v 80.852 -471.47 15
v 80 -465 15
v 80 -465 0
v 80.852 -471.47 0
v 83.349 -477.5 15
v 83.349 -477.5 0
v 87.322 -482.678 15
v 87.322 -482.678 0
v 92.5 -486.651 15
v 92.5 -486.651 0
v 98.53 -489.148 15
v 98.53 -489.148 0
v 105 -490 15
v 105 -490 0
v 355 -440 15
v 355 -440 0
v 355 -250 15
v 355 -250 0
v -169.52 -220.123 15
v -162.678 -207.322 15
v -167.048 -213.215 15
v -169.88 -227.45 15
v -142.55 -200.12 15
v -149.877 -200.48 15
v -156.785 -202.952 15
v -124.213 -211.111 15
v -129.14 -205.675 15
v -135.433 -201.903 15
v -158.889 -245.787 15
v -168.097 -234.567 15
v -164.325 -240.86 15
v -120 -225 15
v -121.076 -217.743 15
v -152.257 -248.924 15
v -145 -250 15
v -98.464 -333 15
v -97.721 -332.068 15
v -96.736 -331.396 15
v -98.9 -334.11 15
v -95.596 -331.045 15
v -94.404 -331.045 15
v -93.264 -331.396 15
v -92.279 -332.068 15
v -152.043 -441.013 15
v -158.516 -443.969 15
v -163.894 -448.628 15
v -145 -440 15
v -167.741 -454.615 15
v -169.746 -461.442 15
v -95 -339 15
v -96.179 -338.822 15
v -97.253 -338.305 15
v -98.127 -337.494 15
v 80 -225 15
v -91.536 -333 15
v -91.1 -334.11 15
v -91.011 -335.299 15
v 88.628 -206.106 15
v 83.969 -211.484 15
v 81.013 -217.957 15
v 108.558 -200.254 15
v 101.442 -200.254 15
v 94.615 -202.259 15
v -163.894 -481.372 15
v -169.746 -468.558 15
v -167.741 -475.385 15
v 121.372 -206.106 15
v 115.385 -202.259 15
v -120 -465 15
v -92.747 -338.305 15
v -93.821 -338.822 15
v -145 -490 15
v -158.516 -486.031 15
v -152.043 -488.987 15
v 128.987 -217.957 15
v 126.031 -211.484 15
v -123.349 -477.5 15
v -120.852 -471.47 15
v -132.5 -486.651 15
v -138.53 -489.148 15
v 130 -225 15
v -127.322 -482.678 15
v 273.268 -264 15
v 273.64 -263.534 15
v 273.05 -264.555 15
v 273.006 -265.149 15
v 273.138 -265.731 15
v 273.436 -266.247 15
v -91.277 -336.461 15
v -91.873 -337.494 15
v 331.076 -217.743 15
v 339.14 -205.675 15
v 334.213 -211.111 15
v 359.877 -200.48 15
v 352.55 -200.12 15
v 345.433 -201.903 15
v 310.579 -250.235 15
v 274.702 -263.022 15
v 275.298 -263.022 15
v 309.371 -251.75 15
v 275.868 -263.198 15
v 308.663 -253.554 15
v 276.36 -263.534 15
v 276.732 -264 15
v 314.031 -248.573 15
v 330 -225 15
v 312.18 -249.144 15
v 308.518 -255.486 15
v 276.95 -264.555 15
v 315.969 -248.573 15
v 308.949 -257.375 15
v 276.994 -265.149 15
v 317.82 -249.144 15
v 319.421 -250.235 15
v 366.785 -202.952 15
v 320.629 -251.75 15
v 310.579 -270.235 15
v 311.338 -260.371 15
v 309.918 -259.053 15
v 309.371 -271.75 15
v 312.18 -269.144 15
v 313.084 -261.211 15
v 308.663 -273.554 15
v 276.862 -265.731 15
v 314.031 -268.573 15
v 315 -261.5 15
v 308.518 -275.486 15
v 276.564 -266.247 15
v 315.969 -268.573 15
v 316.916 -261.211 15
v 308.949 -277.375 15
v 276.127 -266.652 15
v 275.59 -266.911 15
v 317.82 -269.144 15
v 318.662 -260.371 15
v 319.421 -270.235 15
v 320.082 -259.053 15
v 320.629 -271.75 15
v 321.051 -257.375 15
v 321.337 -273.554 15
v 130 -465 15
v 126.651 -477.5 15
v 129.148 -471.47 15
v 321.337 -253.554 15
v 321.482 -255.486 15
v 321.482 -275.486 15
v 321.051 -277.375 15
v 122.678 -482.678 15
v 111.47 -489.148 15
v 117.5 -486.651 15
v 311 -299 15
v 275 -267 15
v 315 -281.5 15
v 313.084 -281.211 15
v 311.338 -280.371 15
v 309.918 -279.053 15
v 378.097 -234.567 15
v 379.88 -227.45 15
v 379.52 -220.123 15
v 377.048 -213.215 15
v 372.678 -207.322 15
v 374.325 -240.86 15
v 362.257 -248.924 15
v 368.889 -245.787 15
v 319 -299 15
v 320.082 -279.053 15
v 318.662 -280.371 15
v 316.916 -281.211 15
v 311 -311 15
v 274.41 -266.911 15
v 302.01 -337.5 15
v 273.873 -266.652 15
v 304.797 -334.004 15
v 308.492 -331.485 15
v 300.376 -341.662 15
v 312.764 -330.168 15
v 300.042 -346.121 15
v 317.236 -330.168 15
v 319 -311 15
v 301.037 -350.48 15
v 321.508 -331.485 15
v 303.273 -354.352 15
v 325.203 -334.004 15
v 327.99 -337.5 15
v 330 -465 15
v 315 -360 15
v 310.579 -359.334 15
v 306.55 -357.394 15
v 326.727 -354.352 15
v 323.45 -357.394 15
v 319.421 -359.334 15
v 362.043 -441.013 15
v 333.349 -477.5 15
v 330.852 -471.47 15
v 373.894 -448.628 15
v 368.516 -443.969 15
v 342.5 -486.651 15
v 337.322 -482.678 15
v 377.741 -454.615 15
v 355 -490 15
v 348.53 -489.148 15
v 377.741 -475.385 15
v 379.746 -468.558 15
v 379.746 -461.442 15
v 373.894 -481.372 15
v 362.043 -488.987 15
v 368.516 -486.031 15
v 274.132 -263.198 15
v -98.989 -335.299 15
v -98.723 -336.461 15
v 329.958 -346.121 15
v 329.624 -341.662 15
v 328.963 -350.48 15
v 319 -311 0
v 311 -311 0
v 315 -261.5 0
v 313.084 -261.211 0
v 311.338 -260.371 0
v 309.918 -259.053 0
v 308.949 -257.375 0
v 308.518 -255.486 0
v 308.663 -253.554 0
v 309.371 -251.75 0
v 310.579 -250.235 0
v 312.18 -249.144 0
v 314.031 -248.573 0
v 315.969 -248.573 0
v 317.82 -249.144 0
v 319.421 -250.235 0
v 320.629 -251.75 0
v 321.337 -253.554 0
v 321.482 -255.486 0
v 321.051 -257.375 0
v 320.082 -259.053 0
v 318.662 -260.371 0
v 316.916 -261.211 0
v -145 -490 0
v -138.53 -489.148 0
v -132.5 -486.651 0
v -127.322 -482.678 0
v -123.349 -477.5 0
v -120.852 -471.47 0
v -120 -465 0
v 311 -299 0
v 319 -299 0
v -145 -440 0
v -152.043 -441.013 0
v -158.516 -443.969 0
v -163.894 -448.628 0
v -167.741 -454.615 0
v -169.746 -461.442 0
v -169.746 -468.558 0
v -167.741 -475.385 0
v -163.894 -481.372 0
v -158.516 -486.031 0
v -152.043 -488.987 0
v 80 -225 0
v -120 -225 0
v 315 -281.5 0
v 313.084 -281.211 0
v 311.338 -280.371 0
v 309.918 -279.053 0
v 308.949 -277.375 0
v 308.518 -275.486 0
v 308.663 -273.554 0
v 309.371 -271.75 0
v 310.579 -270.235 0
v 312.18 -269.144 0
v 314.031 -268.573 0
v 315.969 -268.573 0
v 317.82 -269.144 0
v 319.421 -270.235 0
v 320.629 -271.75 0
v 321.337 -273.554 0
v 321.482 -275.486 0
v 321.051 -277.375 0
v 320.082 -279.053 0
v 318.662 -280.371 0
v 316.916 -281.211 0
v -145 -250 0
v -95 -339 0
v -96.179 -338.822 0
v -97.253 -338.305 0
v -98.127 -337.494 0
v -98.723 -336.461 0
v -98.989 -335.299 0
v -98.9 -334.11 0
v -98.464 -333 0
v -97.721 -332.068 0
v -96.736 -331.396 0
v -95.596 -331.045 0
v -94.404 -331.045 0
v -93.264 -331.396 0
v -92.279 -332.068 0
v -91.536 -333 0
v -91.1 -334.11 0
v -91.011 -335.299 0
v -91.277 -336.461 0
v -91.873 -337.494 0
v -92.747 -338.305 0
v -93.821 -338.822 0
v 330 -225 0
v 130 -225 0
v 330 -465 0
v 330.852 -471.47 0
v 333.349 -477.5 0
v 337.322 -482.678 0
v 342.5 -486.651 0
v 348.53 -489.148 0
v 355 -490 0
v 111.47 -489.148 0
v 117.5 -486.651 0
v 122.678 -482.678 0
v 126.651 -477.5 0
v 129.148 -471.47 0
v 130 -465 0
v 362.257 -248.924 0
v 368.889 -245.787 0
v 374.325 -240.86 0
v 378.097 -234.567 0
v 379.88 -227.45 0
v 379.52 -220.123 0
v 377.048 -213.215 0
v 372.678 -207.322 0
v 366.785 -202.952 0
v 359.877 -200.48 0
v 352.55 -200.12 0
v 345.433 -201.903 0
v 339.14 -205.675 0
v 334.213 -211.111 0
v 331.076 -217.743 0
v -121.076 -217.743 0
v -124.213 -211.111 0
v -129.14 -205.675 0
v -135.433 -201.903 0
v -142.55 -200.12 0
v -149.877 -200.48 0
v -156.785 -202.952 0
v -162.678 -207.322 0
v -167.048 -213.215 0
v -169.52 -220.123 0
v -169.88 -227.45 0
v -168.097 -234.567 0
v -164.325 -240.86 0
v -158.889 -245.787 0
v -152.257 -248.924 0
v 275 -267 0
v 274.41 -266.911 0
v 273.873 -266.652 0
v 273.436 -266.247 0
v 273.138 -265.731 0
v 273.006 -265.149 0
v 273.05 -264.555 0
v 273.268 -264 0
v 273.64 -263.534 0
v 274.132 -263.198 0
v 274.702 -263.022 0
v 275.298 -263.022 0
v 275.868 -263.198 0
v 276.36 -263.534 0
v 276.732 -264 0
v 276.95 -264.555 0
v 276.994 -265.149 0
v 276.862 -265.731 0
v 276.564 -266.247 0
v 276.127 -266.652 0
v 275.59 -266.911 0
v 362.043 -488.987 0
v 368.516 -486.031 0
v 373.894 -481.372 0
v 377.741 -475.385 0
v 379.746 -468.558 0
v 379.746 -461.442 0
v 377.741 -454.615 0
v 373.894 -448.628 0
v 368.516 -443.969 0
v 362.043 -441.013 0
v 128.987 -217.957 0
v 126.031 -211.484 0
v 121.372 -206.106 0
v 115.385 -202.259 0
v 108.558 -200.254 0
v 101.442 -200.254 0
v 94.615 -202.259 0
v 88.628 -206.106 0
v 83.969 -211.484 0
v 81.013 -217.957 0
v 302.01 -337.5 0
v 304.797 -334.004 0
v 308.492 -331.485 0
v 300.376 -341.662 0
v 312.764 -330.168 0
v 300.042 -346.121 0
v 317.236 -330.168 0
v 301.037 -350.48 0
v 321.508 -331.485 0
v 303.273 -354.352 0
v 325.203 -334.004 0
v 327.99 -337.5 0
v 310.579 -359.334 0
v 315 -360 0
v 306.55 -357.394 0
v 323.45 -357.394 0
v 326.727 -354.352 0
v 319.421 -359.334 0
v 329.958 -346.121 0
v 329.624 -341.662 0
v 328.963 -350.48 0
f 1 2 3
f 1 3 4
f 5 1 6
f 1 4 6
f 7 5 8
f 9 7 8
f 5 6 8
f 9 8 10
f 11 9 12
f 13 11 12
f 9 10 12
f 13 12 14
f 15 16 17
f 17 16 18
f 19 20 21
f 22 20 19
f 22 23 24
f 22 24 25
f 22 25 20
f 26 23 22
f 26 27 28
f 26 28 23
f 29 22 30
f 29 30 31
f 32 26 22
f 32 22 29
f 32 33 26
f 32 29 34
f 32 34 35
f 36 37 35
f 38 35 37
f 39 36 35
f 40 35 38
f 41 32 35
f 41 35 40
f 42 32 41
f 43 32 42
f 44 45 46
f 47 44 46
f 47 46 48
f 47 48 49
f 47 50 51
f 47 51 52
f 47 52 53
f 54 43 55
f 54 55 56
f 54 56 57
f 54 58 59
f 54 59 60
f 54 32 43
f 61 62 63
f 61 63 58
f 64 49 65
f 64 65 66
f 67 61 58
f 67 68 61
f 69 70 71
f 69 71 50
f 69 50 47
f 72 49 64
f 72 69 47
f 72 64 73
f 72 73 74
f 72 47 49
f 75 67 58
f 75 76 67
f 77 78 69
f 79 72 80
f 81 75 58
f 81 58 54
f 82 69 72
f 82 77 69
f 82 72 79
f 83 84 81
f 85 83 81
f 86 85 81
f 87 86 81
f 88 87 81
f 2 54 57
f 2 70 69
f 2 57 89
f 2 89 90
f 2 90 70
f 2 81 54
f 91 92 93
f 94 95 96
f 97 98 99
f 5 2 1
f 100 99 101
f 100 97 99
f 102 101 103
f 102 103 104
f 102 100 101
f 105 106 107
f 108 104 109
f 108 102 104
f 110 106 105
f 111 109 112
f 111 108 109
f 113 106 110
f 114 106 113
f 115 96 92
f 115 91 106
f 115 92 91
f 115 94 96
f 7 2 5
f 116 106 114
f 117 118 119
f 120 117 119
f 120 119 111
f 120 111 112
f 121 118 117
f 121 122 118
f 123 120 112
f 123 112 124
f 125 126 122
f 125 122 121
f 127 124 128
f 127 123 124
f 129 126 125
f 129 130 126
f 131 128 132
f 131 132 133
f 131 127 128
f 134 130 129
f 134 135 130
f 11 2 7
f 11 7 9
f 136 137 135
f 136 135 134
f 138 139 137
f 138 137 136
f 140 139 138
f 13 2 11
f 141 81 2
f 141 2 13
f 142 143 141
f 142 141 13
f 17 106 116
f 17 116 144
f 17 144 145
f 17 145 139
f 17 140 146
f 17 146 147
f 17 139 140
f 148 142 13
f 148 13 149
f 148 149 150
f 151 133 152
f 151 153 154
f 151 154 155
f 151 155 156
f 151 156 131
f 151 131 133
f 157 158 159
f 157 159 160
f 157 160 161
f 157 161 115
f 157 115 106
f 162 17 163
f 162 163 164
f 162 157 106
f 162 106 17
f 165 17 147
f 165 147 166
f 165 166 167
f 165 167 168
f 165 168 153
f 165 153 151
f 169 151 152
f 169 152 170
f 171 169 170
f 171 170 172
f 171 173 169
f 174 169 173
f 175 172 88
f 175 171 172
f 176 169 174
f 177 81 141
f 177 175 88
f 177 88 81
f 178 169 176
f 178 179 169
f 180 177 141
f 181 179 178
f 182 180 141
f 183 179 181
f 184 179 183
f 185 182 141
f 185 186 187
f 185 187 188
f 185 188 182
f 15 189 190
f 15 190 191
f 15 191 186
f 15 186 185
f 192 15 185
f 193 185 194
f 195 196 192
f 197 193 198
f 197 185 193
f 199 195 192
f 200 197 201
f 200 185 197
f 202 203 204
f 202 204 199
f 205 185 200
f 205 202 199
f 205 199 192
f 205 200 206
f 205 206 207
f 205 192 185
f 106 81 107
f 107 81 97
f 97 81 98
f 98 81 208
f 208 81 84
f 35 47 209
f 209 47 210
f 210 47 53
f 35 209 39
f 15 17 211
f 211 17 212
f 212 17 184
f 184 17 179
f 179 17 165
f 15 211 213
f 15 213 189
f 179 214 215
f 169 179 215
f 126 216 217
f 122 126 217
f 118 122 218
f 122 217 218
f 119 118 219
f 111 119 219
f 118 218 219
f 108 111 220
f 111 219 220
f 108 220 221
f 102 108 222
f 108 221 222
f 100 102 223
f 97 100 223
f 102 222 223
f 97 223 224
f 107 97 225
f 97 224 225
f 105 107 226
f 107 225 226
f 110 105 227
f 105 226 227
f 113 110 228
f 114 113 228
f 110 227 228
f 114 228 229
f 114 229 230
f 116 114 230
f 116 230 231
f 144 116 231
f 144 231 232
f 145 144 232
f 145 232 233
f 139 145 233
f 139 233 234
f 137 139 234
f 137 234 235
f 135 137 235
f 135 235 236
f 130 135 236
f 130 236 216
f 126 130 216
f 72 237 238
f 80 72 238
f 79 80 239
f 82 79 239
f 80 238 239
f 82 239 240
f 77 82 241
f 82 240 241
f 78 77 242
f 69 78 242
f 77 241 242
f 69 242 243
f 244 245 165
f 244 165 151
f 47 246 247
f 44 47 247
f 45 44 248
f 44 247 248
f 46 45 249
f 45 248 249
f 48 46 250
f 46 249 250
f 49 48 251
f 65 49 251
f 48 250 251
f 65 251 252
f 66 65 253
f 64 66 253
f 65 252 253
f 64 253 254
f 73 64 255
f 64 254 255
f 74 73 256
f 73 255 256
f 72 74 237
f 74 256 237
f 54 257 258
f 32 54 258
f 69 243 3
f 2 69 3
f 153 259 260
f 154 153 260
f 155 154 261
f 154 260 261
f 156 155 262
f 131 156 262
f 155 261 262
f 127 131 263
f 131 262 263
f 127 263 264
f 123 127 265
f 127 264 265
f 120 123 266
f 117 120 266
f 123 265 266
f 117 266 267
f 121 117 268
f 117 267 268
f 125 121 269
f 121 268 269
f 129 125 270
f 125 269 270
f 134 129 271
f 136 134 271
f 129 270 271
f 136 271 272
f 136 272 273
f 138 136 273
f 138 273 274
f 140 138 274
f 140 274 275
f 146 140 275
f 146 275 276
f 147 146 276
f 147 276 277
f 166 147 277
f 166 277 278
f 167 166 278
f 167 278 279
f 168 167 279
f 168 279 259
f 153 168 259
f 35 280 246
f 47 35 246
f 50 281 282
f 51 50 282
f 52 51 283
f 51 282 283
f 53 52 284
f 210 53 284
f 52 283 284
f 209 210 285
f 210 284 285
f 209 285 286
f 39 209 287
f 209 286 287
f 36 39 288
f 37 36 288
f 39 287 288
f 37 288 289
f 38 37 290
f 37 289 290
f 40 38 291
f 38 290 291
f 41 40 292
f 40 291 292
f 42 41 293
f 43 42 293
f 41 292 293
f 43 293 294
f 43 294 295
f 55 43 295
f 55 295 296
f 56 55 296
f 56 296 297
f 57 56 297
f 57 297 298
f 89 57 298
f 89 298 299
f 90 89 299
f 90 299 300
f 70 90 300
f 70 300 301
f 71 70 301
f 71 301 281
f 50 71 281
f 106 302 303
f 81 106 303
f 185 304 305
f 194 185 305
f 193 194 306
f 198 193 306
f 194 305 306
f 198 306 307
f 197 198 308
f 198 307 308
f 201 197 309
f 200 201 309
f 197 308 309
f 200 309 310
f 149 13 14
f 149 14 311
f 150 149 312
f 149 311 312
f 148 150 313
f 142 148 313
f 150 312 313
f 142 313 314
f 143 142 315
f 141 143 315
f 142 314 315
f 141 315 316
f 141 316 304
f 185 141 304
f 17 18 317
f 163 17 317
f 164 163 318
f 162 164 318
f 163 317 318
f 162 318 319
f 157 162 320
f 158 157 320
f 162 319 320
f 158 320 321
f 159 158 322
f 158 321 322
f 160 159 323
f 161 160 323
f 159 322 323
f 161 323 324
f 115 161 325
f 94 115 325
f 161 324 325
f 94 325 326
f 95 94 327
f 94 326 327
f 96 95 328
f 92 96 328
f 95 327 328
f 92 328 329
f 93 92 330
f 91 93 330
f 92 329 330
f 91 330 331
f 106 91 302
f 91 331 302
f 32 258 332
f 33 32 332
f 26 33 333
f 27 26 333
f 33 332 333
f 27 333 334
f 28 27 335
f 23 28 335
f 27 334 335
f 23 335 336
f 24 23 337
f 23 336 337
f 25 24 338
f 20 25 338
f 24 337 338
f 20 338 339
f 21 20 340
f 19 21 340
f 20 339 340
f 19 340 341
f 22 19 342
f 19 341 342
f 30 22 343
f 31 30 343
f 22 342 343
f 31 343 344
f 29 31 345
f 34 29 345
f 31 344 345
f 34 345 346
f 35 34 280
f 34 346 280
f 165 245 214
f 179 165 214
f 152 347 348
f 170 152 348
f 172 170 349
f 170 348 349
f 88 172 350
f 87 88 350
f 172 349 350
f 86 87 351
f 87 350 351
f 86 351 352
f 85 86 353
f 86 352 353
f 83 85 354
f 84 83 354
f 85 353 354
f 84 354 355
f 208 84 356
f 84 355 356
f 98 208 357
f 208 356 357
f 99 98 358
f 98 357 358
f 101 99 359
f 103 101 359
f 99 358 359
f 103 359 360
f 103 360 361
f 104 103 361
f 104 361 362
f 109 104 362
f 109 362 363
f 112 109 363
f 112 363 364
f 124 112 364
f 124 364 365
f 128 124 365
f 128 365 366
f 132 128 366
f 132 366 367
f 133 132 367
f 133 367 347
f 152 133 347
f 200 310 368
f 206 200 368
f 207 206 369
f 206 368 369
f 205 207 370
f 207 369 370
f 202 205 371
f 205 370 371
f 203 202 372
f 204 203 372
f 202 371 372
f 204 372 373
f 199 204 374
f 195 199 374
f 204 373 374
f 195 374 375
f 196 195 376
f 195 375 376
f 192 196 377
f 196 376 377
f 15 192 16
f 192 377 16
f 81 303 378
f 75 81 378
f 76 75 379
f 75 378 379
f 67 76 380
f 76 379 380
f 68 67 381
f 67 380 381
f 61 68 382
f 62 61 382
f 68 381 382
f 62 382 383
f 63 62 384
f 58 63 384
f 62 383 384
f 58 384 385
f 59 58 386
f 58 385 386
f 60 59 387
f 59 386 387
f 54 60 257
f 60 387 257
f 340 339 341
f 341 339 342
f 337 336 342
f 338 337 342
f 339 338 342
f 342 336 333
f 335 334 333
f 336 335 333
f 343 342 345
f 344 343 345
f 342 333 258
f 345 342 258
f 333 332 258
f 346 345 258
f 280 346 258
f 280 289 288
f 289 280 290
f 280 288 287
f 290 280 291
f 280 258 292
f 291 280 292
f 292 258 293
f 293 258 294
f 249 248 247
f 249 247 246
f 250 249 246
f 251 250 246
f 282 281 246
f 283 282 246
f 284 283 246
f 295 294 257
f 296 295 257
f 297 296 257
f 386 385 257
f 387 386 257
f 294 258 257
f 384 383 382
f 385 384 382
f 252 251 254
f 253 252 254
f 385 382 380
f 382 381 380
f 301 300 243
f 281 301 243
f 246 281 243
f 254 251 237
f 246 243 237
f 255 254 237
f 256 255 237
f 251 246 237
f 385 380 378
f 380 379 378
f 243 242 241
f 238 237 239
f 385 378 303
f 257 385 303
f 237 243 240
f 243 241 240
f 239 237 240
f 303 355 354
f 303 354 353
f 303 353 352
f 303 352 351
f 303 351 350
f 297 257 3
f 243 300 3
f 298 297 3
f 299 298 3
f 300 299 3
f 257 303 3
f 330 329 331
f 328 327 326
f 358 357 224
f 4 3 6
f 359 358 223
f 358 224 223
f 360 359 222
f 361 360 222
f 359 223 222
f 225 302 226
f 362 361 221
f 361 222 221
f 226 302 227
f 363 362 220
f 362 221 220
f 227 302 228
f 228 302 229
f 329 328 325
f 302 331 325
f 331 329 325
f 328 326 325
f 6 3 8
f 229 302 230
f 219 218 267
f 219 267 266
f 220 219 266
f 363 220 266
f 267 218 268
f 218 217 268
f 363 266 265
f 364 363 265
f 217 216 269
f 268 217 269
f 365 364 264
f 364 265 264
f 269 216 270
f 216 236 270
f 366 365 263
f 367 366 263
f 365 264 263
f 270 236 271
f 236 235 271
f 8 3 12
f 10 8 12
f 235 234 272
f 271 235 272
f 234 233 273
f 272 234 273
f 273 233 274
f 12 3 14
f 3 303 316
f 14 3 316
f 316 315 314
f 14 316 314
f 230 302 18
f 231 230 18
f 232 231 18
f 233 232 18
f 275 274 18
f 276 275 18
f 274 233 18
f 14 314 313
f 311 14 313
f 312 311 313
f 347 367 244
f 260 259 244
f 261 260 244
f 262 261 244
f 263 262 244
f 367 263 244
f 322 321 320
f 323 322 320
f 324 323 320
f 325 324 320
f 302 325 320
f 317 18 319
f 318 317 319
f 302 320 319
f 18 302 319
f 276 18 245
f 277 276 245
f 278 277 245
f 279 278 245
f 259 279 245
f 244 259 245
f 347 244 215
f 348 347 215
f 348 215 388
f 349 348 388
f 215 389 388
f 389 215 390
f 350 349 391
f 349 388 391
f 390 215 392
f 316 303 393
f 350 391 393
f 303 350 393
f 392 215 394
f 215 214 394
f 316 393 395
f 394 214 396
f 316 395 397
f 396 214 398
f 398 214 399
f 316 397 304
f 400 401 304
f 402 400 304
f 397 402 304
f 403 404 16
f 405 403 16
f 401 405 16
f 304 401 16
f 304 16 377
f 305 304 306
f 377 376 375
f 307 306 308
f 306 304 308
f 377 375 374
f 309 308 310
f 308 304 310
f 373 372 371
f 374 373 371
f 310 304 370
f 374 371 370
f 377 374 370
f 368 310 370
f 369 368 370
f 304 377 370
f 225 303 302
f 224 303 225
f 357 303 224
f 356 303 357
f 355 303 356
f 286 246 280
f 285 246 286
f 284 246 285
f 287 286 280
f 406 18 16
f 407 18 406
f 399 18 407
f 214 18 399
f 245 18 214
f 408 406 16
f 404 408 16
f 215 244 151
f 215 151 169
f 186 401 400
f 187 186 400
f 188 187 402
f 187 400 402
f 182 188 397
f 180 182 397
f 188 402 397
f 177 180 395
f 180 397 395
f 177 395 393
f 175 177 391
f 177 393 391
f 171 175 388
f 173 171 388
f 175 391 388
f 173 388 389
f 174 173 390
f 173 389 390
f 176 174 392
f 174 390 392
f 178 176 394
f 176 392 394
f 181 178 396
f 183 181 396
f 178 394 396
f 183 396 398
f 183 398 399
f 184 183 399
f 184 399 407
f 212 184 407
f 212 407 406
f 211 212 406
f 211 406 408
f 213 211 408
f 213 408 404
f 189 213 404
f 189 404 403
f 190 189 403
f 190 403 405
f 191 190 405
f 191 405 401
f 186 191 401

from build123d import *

# Parameters (mm, degrees)
F1_DEPTH = 15
F2_R     = 15
F2_W     = 12
F2_H     = 8
F2_R_2   = 6.5
F2_R_3   = 4
F2_R_4   = 2
F3_DEPTH = 40
F4_ANGLE = 90


with BuildPart() as f1:
    # F0 (on Top) → F1 (new body)
    with BuildSketch(Plane.XY):
        with BuildLine():
            Line((-120, 225), (-120, 250))
            Line((-120, 250), (-95, 250))
            ThreePointArc((-95, 250), (-137.6776695297, 267.6776695297), (-120, 225))
        make_face()
        with BuildLine():
            Line((-95, 250), (-120, 250))
            Line((-120, 250), (-120, 225))
            ThreePointArc((-120, 225), (-102.3223304703, 232.3223304703), (-95, 250))
        make_face()
        with BuildLine():
            Line((95, 250), (-95, 250))
            ThreePointArc((-95, 250), (-102.3223304703, 232.3223304703), (-120, 225))
            Line((-120, 225), (-120, 25))
            ThreePointArc((-120, 25), (-102.3223304703, 17.6776695297), (-95, 0))
            ThreePointArc((-95, 0), (-102.3223304703, -17.6776695297), (-120, -25))
            Line((-120, -25), (-120, -225))
            ThreePointArc((-120, -225), (-102.3223304703, -232.3223304703), (-95, -250))
            Line((-95, -250), (95, -250))
            ThreePointArc((95, -250), (102.3223304703, -232.3223304703), (120, -225))
            Line((120, -225), (120, -25))
            ThreePointArc((120, -25), (95, 0), (120, 25))
            Line((120, 25), (120, 225))
            ThreePointArc((120, 225), (102.3223304703, 232.3223304703), (95, 250))
        make_face()
        with BuildLine():
            ThreePointArc((145, 250), (120, 275), (95, 250))
            Line((95, 250), (120, 250))
            Line((120, 250), (120, 225))
            ThreePointArc((120, 225), (137.6776695297, 232.3223304703), (145, 250))
        make_face()
        with BuildLine():
            Line((120, 250), (95, 250))
            ThreePointArc((95, 250), (102.3223304703, 232.3223304703), (120, 225))
            Line((120, 225), (120, 250))
        make_face()
        with BuildLine():
            ThreePointArc((-95, 0), (-102.3223304703, 17.6776695297), (-120, 25))
            Line((-120, 25), (-120, -25))
            ThreePointArc((-120, -25), (-102.3223304703, -17.6776695297), (-95, 0))
        make_face()
        with BuildLine():
            Line((-120, -25), (-120, 25))
            ThreePointArc((-120, 25), (-145, 0), (-120, -25))
        make_face()
        with BuildLine():
            ThreePointArc((145, 0), (137.6776695297, 17.6776695297), (120, 25))
            Line((120, 25), (120, -25))
            ThreePointArc((120, -25), (137.6776695297, -17.6776695297), (145, 0))
        make_face()
        with BuildLine():
            Line((120, -25), (120, 25))
            ThreePointArc((120, 25), (95, 0), (120, -25))
        make_face()
        with BuildLine():
            ThreePointArc((-95, -250), (-102.3223304703, -232.3223304703), (-120, -225))
            Line((-120, -225), (-120, -250))
            Line((-120, -250), (-95, -250))
        make_face()
        with BuildLine():
            Line((-120, -250), (-120, -225))
            ThreePointArc((-120, -225), (-137.6776695297, -267.6776695297), (-95, -250))
            Line((-95, -250), (-120, -250))
        make_face()
        with BuildLine():
            ThreePointArc((145, -250), (137.6776695297, -232.3223304703), (120, -225))
            Line((120, -225), (120, -250))
            Line((120, -250), (95, -250))
            ThreePointArc((95, -250), (120, -275), (145, -250))
        make_face()
        with BuildLine():
            Line((120, -250), (120, -225))
            ThreePointArc((120, -225), (102.3223304703, -232.3223304703), (95, -250))
            Line((95, -250), (120, -250))
        make_face()
    extrude(amount=F1_DEPTH)

    # F2 (on face) → F3 (cut)
    with BuildSketch(Plane(origin=(0, 0, 0), x_dir=(1, 0, 0), z_dir=(0, 0, -1))):
        with Locations((0, -210)):
            Circle(F2_R)
        with Locations((-40, -210)):
            Rectangle(F2_W, F2_H)
        with Locations((-70, -210)):
            Circle(F2_R_2)
        with Locations((-90, -210)):
            Circle(F2_R_2)
        with Locations((-10, 200)):
            Circle(F2_R_3)
        with Locations((-80, -170)):
            Circle(F2_R_4)
    extrude(amount=-F3_DEPTH, mode=Mode.SUBTRACT)


with BuildPart() as f1_1:
    # F4: moved
    add(f1.part.rotate(Axis((-120, -225, 7.5), (0, 0, -1)), F4_ANGLE))


solid = f1_1.part
